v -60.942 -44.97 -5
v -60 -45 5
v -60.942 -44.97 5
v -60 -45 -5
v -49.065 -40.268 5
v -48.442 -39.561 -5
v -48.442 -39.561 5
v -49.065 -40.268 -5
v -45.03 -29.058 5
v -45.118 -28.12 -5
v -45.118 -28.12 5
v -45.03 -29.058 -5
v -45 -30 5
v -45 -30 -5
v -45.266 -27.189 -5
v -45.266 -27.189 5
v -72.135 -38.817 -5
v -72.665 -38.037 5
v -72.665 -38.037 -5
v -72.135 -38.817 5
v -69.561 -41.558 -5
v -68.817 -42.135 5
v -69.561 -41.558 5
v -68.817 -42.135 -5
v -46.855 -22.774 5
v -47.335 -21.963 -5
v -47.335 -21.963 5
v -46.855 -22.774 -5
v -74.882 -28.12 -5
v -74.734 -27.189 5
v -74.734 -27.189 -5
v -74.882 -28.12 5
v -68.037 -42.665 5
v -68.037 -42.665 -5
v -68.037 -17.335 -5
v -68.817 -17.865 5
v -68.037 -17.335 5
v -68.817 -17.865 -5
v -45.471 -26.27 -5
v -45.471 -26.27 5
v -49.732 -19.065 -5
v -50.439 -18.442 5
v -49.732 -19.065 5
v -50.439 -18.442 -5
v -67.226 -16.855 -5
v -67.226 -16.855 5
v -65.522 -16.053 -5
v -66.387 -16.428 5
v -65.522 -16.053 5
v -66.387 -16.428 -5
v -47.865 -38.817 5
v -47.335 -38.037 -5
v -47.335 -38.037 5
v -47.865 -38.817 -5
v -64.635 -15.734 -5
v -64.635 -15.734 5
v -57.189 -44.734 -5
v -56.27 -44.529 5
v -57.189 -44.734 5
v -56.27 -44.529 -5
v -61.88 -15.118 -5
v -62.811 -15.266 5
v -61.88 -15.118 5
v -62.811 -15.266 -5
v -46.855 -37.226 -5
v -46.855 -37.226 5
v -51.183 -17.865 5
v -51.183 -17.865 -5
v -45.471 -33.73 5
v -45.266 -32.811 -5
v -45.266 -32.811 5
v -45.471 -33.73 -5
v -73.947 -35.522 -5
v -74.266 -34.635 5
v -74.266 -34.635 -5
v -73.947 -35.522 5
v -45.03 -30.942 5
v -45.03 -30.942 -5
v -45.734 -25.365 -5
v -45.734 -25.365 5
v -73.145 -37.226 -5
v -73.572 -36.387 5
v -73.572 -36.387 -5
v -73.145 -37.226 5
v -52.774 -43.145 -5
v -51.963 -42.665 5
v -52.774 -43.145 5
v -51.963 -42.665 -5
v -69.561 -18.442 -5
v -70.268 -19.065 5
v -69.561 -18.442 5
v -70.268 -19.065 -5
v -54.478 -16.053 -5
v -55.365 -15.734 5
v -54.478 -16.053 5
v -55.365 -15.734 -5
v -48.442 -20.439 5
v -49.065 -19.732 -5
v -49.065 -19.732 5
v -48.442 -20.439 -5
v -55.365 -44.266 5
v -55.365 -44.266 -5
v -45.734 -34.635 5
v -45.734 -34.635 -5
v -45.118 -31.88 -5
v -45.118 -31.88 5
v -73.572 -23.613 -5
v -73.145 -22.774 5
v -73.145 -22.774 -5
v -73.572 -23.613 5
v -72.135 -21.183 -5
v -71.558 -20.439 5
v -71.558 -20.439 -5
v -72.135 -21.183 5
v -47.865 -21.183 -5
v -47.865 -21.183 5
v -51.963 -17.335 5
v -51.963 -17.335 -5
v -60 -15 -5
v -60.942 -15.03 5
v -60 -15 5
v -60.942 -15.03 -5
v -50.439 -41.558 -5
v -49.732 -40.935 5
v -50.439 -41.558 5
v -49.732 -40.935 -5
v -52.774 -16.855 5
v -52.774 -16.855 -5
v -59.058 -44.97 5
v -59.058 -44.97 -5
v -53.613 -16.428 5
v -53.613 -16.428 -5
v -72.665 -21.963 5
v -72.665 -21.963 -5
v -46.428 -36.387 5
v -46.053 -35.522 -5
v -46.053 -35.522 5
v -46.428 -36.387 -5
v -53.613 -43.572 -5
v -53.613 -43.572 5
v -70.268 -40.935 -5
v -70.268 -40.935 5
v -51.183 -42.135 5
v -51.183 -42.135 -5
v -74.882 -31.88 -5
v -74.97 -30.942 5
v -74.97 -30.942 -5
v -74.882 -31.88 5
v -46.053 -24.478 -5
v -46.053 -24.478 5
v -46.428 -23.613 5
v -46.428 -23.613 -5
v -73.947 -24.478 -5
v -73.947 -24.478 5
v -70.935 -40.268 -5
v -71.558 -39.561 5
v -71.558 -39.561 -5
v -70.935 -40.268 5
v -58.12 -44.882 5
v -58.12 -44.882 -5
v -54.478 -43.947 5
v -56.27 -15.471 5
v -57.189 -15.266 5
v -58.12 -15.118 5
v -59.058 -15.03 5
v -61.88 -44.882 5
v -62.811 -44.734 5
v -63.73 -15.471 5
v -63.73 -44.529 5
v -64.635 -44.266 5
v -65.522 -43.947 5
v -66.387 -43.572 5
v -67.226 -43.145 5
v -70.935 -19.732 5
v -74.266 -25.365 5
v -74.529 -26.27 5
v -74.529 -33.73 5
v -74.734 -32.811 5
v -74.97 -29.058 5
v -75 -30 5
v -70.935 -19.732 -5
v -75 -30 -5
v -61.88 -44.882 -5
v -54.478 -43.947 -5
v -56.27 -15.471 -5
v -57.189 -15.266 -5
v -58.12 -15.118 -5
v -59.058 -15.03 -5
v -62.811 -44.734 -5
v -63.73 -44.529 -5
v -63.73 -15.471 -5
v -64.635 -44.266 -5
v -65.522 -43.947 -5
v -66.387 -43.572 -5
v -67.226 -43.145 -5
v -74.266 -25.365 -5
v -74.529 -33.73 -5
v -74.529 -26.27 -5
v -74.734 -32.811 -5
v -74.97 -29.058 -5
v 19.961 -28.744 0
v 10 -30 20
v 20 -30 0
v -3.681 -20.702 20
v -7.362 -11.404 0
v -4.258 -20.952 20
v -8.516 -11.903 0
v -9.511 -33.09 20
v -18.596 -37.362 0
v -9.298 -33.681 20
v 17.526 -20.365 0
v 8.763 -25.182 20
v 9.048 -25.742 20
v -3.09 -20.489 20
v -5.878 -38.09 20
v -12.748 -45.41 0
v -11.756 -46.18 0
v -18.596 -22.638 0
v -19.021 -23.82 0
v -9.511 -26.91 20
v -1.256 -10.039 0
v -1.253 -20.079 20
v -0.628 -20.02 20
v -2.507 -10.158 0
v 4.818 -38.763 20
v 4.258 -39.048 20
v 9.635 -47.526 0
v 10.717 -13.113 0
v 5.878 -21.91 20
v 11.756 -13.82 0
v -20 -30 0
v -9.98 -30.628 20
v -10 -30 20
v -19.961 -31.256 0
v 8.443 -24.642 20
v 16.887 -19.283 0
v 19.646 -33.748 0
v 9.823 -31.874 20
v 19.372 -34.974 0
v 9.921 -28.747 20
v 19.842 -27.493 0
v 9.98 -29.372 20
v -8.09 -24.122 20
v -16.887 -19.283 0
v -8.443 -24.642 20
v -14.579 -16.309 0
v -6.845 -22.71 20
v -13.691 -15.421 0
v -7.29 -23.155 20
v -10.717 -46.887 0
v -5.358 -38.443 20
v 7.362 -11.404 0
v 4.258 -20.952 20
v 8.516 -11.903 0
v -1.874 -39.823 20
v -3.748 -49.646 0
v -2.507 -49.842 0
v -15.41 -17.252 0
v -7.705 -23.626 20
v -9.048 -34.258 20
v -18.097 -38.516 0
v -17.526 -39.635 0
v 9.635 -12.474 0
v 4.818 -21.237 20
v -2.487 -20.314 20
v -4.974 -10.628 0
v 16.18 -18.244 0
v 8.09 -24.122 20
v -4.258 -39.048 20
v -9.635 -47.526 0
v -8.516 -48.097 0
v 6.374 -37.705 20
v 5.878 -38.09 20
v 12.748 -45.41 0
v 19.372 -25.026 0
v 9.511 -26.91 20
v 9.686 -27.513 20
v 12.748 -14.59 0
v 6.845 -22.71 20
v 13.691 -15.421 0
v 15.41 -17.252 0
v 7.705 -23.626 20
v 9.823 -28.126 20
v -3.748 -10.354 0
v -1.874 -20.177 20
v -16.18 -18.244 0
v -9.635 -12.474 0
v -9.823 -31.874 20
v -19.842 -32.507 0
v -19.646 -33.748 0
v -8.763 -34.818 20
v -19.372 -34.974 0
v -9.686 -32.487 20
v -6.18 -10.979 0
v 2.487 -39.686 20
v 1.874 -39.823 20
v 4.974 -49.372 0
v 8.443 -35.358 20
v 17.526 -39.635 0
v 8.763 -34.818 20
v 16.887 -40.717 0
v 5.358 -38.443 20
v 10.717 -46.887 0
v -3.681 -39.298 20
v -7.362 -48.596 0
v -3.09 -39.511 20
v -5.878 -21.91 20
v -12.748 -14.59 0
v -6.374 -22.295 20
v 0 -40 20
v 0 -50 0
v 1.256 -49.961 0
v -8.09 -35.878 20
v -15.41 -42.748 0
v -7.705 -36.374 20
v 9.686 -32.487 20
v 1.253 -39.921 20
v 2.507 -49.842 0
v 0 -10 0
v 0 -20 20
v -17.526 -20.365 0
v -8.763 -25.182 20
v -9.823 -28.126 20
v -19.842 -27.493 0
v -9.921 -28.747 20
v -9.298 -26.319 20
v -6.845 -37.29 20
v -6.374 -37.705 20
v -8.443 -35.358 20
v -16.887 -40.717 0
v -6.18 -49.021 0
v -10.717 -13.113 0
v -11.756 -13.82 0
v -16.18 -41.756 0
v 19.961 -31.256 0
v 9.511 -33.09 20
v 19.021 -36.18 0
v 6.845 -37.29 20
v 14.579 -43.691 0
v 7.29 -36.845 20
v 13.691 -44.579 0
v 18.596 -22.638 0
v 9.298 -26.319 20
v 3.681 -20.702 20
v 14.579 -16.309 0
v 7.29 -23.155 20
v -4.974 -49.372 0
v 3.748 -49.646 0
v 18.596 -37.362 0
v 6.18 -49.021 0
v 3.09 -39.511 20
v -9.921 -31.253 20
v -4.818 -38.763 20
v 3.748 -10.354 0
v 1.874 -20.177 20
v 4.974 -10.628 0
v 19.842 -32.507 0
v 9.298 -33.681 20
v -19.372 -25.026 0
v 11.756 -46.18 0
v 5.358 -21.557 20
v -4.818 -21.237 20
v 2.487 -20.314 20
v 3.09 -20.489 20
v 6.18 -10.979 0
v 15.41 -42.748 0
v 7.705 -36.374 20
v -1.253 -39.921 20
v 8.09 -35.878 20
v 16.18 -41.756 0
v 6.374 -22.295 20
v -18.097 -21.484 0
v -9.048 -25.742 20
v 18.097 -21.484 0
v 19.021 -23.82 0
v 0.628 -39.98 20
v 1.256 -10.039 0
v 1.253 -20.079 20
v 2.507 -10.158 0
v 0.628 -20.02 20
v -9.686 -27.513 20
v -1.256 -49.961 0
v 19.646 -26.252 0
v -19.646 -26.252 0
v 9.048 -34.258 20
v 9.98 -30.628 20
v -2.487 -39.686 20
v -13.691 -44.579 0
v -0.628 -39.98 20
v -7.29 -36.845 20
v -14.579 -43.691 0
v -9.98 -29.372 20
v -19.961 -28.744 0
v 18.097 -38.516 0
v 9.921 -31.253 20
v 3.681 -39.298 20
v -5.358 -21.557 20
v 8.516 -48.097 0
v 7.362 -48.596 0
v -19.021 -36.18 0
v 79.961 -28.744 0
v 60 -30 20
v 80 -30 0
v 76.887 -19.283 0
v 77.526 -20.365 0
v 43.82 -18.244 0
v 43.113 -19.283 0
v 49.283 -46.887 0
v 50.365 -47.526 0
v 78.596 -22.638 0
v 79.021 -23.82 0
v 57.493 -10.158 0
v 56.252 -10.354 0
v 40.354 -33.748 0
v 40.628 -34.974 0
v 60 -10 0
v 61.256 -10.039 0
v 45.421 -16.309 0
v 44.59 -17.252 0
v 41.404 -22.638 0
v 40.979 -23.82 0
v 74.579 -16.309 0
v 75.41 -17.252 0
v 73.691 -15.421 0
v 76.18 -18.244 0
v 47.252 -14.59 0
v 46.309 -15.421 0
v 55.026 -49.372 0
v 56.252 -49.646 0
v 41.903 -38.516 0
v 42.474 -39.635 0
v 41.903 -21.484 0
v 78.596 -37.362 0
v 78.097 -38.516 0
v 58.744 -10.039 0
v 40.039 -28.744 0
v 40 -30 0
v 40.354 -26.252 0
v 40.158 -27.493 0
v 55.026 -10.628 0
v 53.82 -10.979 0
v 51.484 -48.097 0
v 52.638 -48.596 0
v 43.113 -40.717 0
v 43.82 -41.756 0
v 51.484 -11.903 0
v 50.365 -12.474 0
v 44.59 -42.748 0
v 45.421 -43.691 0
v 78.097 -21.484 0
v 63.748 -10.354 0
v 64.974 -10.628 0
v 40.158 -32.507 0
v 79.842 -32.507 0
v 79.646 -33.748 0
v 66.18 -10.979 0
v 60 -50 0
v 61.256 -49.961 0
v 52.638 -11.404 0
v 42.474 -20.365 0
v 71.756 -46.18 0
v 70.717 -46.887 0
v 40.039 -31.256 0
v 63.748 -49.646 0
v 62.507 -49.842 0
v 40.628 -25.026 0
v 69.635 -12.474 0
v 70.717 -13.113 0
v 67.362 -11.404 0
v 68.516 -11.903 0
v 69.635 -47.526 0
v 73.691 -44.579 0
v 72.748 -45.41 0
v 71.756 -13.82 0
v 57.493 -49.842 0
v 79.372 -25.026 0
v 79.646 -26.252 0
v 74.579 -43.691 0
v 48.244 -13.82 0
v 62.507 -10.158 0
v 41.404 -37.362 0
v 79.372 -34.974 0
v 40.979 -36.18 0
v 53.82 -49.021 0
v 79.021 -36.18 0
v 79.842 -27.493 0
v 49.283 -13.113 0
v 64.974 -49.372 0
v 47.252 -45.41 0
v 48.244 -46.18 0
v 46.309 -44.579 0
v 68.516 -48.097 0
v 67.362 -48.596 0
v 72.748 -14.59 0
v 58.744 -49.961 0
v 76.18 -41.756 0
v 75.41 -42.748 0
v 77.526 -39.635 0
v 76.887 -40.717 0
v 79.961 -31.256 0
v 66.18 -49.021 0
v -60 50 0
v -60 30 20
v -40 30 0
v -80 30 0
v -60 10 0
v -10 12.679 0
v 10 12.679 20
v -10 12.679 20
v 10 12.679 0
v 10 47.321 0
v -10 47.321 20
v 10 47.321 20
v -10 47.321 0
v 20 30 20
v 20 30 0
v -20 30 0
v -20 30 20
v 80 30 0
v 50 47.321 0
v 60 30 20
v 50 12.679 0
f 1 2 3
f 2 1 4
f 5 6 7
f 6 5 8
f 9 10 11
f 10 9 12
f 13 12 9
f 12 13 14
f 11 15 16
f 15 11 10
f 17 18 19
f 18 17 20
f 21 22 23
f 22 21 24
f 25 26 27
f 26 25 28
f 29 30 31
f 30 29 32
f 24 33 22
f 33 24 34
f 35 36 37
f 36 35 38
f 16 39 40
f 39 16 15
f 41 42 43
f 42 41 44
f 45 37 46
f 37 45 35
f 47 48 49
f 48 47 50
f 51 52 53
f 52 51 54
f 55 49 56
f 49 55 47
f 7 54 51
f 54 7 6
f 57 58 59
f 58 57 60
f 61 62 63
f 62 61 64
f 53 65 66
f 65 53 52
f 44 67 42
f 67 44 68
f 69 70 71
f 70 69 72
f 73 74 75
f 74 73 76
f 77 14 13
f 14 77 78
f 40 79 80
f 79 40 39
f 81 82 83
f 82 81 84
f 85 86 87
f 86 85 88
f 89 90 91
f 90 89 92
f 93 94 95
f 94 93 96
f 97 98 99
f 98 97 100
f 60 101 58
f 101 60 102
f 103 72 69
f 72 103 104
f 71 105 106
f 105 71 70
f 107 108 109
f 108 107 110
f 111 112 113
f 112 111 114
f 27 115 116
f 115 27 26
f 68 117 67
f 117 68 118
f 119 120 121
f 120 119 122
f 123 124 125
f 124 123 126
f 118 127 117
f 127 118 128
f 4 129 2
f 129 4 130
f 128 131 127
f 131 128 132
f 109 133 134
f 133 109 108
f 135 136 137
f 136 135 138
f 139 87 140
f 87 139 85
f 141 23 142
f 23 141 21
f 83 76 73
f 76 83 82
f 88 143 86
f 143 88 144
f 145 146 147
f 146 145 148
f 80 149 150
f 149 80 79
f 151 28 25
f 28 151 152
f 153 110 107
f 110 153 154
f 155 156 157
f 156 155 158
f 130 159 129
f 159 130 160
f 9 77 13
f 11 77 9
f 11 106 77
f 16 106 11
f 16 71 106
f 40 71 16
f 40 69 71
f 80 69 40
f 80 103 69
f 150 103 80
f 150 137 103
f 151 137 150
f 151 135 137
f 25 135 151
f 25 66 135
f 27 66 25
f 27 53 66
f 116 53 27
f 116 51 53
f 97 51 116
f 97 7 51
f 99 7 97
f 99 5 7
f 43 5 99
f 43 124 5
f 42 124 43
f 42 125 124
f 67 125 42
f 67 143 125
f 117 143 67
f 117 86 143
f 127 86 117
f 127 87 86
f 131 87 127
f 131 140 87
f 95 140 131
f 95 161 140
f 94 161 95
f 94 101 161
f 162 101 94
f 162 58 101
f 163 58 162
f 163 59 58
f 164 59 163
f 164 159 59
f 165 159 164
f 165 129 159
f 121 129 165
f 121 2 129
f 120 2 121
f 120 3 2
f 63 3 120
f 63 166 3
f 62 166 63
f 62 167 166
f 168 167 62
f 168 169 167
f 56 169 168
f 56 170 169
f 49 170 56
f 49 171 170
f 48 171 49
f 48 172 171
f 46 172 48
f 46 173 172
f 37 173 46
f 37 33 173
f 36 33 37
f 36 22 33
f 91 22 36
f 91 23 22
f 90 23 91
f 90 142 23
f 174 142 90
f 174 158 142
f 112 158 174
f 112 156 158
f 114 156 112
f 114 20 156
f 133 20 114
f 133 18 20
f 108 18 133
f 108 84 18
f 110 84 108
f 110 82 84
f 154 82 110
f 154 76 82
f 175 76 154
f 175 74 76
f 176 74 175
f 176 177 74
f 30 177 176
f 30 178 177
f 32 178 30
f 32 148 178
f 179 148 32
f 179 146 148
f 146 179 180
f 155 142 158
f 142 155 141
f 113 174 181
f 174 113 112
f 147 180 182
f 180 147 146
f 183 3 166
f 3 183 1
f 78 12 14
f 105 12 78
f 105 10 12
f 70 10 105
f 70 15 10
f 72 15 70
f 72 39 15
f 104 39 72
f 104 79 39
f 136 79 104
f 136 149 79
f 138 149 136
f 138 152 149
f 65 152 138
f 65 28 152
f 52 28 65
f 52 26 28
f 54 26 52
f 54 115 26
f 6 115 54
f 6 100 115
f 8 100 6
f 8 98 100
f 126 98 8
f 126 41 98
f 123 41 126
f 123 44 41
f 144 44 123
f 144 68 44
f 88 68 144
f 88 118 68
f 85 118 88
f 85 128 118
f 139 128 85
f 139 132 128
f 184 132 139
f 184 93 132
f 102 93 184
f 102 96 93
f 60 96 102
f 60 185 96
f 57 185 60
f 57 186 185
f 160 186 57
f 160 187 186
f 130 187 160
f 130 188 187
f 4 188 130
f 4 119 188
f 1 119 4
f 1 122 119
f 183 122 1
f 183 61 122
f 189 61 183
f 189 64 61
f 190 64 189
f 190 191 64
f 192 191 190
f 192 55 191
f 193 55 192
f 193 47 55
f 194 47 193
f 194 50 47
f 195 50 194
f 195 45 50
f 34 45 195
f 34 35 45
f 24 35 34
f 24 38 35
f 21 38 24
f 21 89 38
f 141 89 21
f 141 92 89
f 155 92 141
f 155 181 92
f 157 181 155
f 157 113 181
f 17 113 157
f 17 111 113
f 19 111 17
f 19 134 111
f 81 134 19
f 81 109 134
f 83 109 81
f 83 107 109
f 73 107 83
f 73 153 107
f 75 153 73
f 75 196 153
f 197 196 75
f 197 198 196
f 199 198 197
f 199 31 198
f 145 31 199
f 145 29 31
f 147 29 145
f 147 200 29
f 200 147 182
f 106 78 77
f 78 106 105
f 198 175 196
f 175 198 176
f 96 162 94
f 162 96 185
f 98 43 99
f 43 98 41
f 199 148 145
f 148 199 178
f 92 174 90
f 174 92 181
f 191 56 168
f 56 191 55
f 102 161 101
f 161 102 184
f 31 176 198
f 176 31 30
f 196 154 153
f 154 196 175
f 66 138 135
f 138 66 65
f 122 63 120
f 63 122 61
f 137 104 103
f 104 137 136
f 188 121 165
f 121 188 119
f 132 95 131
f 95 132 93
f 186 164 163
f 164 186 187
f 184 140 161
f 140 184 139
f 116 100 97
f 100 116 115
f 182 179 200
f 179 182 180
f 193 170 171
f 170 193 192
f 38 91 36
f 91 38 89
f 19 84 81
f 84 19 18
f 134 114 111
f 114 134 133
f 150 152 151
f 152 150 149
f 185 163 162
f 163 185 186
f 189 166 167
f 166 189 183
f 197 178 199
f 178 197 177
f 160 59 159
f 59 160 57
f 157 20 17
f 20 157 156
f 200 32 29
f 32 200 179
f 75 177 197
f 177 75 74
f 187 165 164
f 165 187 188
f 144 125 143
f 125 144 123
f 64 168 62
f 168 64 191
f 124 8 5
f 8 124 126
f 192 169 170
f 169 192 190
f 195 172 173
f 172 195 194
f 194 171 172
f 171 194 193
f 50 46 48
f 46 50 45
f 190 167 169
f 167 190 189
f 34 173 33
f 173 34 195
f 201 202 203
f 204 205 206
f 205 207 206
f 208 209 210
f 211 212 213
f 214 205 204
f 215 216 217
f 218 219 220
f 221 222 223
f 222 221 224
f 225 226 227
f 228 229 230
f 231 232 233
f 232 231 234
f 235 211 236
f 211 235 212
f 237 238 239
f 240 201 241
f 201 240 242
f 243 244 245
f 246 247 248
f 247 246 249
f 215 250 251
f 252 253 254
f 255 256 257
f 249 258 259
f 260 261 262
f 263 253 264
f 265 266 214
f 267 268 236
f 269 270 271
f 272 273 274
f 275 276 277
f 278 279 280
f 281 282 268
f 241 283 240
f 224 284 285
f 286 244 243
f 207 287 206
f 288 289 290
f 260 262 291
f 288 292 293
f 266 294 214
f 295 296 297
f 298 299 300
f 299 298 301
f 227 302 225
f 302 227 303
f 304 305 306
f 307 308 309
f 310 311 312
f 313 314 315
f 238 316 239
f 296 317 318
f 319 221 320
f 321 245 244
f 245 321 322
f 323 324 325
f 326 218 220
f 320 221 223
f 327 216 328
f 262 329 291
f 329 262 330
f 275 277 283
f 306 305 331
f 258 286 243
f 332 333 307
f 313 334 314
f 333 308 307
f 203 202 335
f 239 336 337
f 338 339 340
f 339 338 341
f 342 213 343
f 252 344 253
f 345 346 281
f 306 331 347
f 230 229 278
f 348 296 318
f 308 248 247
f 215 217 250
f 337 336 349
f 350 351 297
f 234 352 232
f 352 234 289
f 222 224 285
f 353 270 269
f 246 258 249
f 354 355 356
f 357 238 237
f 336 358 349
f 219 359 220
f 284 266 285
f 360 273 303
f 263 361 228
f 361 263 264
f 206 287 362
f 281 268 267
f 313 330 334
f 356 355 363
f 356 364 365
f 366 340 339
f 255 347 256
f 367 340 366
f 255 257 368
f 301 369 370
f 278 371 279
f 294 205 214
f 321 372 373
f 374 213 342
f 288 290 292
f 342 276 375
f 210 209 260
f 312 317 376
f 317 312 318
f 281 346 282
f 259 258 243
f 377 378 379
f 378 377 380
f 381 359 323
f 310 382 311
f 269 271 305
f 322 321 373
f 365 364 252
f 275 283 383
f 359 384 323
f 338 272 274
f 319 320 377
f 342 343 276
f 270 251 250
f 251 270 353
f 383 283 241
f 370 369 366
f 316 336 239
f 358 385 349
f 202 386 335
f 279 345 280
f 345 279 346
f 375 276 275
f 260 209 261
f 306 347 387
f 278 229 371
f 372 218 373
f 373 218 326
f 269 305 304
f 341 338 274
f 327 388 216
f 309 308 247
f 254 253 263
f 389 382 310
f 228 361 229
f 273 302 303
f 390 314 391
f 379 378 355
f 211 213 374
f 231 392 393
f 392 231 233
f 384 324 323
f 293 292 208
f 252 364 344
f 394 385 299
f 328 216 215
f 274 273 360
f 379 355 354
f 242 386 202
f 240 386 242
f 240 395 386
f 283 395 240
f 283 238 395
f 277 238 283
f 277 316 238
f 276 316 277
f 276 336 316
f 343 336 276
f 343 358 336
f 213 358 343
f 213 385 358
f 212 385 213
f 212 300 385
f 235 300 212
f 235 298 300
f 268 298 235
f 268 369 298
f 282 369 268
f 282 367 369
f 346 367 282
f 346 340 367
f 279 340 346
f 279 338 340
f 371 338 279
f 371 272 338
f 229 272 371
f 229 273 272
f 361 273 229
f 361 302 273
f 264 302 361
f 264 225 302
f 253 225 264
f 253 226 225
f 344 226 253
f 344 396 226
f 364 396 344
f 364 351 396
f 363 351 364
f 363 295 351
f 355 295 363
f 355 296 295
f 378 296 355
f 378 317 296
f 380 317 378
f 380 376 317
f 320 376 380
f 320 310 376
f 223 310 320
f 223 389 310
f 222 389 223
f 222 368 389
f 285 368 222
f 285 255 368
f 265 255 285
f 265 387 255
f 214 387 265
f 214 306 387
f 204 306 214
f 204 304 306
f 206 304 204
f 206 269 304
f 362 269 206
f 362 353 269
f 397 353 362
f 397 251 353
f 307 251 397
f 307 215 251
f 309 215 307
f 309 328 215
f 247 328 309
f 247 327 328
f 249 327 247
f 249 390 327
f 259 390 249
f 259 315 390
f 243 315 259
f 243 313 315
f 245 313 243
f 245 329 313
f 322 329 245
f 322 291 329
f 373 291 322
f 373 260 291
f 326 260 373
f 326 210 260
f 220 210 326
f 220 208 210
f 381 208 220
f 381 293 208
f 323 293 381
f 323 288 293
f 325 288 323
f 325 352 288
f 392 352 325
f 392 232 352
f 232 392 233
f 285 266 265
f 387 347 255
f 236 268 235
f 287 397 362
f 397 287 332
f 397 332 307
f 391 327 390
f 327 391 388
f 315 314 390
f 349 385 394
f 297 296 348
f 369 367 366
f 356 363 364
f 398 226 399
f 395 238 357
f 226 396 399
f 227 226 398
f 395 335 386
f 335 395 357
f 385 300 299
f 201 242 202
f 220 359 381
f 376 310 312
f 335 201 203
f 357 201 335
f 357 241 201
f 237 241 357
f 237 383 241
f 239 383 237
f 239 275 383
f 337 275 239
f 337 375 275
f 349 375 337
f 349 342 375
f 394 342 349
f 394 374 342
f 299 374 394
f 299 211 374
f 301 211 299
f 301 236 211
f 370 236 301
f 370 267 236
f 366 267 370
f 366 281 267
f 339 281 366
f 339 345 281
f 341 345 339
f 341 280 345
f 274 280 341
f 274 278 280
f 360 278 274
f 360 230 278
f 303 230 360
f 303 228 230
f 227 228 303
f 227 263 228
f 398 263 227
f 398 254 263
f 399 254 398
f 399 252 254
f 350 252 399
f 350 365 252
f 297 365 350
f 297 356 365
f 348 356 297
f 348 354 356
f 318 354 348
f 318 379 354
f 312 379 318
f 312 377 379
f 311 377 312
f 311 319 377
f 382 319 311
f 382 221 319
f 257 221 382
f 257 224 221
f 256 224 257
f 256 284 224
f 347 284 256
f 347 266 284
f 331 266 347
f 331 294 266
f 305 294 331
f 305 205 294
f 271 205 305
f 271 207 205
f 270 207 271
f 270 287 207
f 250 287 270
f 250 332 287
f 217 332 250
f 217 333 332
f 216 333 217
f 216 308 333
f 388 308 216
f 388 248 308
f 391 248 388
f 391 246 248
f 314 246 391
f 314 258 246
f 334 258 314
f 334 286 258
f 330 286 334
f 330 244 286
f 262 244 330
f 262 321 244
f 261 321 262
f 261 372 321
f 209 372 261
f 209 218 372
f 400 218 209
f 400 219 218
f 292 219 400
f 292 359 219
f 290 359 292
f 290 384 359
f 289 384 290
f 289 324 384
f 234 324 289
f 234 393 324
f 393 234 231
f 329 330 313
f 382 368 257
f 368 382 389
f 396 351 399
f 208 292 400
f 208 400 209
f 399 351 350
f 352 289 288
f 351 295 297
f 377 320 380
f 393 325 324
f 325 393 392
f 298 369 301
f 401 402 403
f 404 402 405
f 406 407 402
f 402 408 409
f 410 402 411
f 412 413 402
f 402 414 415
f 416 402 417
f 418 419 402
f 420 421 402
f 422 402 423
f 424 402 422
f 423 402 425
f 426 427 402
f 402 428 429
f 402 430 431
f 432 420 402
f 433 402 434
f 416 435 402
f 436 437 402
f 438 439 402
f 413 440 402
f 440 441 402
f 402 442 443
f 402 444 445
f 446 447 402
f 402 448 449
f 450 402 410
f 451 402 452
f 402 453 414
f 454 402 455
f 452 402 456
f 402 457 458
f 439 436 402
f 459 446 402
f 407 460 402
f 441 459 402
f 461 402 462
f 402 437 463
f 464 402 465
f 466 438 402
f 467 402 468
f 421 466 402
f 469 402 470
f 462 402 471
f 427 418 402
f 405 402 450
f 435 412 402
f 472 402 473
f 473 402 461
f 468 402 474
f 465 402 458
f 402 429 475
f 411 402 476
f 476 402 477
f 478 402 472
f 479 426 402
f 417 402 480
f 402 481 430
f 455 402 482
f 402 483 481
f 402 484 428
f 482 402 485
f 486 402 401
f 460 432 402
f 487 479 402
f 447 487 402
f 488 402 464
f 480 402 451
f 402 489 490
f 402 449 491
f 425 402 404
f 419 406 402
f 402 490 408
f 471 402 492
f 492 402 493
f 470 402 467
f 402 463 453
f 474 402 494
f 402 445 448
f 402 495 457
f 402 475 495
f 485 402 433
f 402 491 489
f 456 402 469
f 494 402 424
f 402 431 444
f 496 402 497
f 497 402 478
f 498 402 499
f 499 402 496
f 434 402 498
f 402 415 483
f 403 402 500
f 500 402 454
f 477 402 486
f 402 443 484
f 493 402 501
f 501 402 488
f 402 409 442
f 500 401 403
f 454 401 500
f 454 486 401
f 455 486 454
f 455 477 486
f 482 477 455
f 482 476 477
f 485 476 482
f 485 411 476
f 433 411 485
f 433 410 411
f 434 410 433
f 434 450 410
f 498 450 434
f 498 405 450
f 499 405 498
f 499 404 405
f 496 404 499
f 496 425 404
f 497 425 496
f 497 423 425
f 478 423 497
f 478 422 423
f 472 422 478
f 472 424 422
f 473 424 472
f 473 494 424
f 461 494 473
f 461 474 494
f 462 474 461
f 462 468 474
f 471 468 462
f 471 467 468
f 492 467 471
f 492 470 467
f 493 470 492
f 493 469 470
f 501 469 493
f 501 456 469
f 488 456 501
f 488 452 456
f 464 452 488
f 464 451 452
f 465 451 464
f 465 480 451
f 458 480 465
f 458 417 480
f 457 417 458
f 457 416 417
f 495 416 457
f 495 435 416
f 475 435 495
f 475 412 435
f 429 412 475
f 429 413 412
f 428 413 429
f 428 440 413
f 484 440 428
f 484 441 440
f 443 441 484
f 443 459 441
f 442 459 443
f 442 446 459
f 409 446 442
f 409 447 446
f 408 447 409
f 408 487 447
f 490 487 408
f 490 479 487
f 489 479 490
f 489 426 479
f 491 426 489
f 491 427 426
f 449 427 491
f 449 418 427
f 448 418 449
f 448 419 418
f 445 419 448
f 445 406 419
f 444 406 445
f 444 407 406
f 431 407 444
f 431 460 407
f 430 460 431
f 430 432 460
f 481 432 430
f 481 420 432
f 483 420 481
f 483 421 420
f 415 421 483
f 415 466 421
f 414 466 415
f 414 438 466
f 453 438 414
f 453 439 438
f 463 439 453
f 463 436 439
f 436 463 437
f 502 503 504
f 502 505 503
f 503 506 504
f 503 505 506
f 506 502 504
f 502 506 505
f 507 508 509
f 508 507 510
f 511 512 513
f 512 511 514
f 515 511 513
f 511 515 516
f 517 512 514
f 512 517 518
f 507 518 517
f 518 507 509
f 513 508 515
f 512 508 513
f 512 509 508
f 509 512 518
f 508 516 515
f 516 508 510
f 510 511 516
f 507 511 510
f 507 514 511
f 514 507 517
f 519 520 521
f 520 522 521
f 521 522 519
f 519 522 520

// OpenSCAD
distancia = 60;

translate([-2*distancia/2,-distancia/2,0]){
		//CILINDRO NORMAL
		translate([0,0,0])
			color("gold")
				cylinder(r=30/2,h=10,center=true,$fn=100);

		// CONO TRUNCADO
		translate([distancia,0,0])
			color("green")
				cylinder(r1=20,r2=10,h=20,$fn=100);

		//CONO
		translate([distancia*2,0,0])
			color("red")
				cylinder(r1=20,r2=0,h=20,$fn=100);

		//PIRAMIDE
		translate([0,distancia,0])
			color("blue")
				cylinder(r1=20,r2=0,h=20,$fn=4);


		//HEXAGONO
		translate([distancia,distancia,0])
			color("orange")
				cylinder(r1=20,r2=20,h=20,$fn=6);

		//TETAEDRO
		translate([distancia * 2,distancia,0])
			color("purple")
				cylinder(r1=20,r2=0,h=20,$fn=3);
}
